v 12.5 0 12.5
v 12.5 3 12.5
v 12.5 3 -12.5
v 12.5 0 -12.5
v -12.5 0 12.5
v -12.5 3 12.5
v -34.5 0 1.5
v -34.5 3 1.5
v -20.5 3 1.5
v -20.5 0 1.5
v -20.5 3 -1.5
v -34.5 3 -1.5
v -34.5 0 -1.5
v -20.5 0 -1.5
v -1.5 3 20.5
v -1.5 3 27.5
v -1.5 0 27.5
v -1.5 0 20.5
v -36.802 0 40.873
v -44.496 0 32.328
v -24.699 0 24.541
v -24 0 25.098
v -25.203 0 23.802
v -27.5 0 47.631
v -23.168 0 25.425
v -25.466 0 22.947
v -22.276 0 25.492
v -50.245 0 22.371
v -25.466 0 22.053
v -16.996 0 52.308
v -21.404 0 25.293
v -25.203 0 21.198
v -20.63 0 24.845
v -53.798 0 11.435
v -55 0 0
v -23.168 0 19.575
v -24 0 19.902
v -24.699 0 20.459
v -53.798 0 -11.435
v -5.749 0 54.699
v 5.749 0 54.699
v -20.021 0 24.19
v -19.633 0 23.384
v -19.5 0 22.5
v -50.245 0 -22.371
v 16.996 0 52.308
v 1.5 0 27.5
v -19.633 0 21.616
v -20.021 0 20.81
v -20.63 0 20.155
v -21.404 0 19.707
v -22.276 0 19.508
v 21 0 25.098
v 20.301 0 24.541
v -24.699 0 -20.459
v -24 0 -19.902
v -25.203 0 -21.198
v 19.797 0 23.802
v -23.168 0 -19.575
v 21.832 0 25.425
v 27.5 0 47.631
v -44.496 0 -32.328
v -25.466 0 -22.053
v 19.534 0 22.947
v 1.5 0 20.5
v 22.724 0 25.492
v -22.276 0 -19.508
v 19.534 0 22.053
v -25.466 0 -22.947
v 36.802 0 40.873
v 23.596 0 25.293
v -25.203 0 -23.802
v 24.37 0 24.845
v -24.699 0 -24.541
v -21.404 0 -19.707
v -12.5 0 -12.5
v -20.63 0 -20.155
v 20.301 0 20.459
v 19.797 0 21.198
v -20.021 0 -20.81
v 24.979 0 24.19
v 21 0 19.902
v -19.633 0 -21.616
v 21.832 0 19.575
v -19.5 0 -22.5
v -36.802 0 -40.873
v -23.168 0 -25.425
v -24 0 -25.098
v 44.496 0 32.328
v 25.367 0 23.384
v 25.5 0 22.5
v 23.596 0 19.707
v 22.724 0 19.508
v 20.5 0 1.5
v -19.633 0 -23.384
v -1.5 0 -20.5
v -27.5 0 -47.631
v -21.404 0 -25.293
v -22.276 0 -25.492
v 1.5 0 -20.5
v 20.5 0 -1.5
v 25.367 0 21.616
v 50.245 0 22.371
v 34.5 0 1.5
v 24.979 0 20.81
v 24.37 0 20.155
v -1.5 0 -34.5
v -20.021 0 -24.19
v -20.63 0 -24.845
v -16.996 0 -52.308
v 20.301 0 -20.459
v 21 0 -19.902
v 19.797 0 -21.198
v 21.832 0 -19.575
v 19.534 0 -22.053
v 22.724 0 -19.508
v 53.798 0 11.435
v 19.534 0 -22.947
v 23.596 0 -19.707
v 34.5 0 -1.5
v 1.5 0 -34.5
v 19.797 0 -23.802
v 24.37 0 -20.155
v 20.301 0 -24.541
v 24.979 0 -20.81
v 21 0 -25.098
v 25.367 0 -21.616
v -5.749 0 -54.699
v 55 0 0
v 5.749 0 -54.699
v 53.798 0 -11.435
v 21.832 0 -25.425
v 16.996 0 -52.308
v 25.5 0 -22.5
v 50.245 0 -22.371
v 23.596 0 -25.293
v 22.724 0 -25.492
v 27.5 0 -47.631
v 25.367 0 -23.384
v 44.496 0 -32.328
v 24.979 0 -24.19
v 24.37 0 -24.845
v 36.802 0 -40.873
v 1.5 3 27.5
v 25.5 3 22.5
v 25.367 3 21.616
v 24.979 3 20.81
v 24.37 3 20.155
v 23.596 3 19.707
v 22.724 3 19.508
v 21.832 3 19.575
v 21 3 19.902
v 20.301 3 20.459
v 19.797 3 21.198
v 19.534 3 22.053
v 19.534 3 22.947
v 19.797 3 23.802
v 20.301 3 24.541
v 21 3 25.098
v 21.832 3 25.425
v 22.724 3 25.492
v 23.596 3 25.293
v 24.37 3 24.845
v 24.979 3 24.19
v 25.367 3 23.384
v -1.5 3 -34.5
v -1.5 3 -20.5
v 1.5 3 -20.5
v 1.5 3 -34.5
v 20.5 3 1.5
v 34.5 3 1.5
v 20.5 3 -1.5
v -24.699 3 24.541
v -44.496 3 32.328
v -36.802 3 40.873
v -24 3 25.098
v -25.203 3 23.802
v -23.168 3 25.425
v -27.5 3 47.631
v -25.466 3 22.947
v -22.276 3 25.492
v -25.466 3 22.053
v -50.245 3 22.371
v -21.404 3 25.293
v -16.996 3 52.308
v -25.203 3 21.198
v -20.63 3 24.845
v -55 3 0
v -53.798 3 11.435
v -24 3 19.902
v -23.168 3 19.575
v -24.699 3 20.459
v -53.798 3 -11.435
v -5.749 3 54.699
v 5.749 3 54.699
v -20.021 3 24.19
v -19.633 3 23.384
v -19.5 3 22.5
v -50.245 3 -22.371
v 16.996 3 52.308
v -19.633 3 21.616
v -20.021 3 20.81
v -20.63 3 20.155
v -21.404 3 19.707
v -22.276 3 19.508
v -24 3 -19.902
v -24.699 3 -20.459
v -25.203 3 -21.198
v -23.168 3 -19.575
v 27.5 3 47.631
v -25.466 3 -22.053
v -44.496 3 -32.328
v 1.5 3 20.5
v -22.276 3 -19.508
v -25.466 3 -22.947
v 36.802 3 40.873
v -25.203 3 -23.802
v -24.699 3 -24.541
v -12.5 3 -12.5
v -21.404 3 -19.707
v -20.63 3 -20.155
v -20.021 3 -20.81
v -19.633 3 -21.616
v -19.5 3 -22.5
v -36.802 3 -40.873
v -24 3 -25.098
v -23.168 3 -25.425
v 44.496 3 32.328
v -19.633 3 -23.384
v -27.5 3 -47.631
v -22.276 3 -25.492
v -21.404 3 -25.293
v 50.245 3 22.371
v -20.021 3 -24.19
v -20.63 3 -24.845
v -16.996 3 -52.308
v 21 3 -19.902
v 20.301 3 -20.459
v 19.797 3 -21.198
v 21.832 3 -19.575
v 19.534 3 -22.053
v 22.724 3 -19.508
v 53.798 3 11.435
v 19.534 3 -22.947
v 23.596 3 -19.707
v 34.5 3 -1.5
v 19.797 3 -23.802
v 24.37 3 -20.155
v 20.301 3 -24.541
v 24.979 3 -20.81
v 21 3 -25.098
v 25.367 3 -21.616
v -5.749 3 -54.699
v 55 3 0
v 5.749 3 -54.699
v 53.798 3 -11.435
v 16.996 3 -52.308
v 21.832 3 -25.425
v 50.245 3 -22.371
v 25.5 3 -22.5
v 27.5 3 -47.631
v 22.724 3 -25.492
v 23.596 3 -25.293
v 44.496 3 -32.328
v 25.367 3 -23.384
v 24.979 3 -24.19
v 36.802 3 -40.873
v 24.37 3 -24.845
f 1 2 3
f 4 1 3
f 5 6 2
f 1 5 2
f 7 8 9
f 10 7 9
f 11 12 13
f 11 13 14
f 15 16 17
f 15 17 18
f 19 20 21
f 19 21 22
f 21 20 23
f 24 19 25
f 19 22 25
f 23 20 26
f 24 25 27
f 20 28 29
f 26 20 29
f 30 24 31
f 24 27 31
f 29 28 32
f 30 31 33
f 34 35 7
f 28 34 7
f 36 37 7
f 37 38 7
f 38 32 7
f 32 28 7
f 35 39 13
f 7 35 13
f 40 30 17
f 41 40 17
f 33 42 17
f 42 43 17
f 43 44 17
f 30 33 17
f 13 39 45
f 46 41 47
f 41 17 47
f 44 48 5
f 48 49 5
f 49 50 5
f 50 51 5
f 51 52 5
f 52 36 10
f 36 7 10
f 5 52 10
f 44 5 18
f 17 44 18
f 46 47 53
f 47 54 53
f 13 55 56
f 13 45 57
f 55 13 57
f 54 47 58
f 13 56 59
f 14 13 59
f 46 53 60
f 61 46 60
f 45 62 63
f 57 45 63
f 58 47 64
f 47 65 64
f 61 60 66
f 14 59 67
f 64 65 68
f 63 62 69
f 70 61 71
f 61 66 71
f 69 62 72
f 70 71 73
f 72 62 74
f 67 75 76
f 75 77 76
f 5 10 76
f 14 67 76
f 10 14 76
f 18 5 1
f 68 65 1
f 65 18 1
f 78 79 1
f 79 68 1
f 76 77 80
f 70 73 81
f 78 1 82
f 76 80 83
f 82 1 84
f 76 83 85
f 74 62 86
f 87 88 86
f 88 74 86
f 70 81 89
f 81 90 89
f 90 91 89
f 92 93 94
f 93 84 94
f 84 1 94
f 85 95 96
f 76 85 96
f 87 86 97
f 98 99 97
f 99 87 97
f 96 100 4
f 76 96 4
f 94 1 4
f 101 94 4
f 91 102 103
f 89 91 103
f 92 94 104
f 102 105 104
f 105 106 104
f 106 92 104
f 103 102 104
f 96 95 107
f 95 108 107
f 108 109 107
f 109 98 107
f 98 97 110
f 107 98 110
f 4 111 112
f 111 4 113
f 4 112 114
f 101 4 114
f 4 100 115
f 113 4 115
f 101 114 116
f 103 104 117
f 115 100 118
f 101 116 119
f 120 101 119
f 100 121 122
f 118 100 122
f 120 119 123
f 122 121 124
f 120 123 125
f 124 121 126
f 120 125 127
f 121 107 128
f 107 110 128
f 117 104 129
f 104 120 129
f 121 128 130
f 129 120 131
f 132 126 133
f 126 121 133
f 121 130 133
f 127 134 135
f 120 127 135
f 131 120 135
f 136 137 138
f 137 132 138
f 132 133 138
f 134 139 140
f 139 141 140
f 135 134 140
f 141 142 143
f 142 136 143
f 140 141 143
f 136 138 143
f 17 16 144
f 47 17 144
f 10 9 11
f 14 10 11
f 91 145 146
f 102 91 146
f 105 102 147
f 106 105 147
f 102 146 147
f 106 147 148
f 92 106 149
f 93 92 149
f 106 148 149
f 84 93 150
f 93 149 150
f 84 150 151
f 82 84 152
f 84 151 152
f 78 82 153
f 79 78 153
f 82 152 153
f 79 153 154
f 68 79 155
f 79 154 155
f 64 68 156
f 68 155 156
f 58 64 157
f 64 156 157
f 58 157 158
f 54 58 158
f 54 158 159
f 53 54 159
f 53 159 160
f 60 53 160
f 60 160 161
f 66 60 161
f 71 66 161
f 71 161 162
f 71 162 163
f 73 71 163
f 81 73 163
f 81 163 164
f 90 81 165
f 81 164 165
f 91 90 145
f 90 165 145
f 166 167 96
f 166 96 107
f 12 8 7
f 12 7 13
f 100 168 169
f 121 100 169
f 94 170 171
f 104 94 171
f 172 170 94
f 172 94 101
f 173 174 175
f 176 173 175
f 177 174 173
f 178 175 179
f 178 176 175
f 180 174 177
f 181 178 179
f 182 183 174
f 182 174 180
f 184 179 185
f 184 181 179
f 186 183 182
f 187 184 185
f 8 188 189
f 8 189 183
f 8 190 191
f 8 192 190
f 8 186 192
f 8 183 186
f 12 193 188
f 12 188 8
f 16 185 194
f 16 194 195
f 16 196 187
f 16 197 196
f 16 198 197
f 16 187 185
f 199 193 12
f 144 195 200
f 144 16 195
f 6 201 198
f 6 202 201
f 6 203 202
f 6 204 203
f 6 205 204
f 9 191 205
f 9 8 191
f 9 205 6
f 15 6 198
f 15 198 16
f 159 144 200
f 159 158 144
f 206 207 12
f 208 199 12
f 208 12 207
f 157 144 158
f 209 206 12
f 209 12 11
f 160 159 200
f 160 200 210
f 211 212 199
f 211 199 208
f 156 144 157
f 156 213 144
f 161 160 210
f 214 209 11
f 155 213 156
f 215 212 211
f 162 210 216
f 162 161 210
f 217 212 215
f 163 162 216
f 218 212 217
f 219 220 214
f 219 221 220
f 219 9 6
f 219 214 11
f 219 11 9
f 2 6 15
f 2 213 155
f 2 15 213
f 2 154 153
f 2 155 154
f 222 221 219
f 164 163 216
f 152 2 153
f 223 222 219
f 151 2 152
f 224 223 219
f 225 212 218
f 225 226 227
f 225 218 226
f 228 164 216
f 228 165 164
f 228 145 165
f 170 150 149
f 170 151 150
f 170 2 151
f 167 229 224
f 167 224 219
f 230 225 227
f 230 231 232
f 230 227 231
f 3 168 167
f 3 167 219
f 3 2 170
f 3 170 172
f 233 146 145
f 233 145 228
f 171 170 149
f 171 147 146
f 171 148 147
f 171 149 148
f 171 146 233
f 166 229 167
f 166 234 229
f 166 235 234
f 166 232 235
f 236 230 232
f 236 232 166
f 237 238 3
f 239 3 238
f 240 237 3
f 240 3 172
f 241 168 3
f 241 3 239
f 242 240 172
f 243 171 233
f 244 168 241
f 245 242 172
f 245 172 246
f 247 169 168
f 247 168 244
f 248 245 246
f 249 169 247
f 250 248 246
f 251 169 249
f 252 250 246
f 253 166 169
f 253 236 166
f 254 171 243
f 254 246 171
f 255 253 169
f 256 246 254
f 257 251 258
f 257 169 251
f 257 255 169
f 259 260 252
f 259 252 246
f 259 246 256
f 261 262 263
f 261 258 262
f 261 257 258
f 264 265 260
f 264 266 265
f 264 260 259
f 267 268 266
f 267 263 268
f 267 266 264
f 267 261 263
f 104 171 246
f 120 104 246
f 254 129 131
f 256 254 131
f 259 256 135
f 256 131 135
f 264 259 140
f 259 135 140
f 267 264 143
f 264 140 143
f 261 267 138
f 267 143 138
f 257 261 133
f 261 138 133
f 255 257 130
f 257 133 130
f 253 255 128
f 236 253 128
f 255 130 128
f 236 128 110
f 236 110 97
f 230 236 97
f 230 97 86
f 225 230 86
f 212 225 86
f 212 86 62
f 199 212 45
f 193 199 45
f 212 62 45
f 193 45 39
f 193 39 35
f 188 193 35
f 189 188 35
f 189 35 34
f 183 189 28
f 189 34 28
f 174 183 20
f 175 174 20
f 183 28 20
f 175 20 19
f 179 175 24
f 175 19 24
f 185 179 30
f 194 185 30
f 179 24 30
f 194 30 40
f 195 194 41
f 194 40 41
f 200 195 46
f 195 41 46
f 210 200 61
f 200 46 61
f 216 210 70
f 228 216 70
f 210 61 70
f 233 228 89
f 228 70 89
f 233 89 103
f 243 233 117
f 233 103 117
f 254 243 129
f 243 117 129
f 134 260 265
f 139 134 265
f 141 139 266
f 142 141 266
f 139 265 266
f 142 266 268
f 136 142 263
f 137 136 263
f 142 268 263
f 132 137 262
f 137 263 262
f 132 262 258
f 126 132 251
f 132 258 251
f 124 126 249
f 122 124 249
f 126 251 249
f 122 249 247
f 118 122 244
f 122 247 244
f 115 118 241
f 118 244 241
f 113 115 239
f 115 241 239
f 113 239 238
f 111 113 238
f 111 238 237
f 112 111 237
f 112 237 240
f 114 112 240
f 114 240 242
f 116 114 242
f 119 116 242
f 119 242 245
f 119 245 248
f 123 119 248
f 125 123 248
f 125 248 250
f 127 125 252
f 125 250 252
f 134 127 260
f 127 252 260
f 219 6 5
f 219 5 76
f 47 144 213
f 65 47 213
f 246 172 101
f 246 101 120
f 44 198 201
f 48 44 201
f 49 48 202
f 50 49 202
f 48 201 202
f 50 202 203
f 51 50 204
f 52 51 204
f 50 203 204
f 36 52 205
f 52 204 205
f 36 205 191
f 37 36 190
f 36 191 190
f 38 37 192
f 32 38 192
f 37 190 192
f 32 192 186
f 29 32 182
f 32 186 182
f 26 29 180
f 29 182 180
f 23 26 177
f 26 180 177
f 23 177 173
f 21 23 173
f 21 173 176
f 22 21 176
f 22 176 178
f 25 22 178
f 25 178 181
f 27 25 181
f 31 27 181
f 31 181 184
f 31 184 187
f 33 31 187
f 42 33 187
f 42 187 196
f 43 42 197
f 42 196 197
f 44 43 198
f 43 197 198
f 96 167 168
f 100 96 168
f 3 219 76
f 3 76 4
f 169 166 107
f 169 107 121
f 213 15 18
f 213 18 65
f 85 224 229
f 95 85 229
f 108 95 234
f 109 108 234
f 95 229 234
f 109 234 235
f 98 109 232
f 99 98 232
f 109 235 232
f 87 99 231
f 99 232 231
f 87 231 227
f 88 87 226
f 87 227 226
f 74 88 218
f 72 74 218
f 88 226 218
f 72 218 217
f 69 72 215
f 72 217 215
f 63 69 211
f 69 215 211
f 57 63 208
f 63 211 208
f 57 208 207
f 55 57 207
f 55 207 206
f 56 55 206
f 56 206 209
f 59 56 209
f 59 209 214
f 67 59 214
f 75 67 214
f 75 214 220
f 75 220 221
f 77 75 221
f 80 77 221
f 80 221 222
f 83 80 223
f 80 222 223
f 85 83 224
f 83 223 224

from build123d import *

# Parameters (mm, degrees)
SKETCH1_R           = 55
BOSS_EXTRUDE1_DEPTH = 3
SKETCH2_R           = 3
SKETCH2_W           = 25
SKETCH2_H           = 25
SKETCH2_W_2         = 3
SKETCH2_H_2         = 14
SKETCH2_W_3         = 14
SKETCH2_H_3         = 3
SKETCH2_H_4         = 7
CUT_EXTRUDE1_DEPTH  = 3


with BuildPart() as part:
    # Sketch1 → Boss-Extrude1 (new body)
    with BuildSketch(Plane(origin=(0, 0, 0), x_dir=(1, 0, 0), z_dir=(0, 1, 0))):
        Circle(SKETCH1_R)
    extrude(amount=BOSS_EXTRUDE1_DEPTH)

    # Sketch2 → Cut-Extrude1 (cut)
    with BuildSketch(Plane(origin=(0, 3, 0), x_dir=(1, 0, 0), z_dir=(0, 1, 0))):
        with Locations((-22.5, 22.5)):
            Circle(SKETCH2_R)
        with Locations((22.5, 22.5)):
            Circle(SKETCH2_R)
        with Locations((22.5, -22.5)):
            Circle(SKETCH2_R)
        with Locations((-22.5, -22.5)):
            Circle(SKETCH2_R)
        Rectangle(SKETCH2_W, SKETCH2_H)
        with Locations((0, 27.5)):
            Rectangle(SKETCH2_W_2, SKETCH2_H_2)
        with Locations((-27.5, 0)):
            Rectangle(SKETCH2_W_3, SKETCH2_H_3)
        with Locations((27.5, 0)):
            Rectangle(SKETCH2_W_3, SKETCH2_H_3)
        with Locations((0, -24)):
            Rectangle(SKETCH2_W_2, SKETCH2_H_4)
    extrude(amount=-CUT_EXTRUDE1_DEPTH, mode=Mode.SUBTRACT)


solid = part.part
